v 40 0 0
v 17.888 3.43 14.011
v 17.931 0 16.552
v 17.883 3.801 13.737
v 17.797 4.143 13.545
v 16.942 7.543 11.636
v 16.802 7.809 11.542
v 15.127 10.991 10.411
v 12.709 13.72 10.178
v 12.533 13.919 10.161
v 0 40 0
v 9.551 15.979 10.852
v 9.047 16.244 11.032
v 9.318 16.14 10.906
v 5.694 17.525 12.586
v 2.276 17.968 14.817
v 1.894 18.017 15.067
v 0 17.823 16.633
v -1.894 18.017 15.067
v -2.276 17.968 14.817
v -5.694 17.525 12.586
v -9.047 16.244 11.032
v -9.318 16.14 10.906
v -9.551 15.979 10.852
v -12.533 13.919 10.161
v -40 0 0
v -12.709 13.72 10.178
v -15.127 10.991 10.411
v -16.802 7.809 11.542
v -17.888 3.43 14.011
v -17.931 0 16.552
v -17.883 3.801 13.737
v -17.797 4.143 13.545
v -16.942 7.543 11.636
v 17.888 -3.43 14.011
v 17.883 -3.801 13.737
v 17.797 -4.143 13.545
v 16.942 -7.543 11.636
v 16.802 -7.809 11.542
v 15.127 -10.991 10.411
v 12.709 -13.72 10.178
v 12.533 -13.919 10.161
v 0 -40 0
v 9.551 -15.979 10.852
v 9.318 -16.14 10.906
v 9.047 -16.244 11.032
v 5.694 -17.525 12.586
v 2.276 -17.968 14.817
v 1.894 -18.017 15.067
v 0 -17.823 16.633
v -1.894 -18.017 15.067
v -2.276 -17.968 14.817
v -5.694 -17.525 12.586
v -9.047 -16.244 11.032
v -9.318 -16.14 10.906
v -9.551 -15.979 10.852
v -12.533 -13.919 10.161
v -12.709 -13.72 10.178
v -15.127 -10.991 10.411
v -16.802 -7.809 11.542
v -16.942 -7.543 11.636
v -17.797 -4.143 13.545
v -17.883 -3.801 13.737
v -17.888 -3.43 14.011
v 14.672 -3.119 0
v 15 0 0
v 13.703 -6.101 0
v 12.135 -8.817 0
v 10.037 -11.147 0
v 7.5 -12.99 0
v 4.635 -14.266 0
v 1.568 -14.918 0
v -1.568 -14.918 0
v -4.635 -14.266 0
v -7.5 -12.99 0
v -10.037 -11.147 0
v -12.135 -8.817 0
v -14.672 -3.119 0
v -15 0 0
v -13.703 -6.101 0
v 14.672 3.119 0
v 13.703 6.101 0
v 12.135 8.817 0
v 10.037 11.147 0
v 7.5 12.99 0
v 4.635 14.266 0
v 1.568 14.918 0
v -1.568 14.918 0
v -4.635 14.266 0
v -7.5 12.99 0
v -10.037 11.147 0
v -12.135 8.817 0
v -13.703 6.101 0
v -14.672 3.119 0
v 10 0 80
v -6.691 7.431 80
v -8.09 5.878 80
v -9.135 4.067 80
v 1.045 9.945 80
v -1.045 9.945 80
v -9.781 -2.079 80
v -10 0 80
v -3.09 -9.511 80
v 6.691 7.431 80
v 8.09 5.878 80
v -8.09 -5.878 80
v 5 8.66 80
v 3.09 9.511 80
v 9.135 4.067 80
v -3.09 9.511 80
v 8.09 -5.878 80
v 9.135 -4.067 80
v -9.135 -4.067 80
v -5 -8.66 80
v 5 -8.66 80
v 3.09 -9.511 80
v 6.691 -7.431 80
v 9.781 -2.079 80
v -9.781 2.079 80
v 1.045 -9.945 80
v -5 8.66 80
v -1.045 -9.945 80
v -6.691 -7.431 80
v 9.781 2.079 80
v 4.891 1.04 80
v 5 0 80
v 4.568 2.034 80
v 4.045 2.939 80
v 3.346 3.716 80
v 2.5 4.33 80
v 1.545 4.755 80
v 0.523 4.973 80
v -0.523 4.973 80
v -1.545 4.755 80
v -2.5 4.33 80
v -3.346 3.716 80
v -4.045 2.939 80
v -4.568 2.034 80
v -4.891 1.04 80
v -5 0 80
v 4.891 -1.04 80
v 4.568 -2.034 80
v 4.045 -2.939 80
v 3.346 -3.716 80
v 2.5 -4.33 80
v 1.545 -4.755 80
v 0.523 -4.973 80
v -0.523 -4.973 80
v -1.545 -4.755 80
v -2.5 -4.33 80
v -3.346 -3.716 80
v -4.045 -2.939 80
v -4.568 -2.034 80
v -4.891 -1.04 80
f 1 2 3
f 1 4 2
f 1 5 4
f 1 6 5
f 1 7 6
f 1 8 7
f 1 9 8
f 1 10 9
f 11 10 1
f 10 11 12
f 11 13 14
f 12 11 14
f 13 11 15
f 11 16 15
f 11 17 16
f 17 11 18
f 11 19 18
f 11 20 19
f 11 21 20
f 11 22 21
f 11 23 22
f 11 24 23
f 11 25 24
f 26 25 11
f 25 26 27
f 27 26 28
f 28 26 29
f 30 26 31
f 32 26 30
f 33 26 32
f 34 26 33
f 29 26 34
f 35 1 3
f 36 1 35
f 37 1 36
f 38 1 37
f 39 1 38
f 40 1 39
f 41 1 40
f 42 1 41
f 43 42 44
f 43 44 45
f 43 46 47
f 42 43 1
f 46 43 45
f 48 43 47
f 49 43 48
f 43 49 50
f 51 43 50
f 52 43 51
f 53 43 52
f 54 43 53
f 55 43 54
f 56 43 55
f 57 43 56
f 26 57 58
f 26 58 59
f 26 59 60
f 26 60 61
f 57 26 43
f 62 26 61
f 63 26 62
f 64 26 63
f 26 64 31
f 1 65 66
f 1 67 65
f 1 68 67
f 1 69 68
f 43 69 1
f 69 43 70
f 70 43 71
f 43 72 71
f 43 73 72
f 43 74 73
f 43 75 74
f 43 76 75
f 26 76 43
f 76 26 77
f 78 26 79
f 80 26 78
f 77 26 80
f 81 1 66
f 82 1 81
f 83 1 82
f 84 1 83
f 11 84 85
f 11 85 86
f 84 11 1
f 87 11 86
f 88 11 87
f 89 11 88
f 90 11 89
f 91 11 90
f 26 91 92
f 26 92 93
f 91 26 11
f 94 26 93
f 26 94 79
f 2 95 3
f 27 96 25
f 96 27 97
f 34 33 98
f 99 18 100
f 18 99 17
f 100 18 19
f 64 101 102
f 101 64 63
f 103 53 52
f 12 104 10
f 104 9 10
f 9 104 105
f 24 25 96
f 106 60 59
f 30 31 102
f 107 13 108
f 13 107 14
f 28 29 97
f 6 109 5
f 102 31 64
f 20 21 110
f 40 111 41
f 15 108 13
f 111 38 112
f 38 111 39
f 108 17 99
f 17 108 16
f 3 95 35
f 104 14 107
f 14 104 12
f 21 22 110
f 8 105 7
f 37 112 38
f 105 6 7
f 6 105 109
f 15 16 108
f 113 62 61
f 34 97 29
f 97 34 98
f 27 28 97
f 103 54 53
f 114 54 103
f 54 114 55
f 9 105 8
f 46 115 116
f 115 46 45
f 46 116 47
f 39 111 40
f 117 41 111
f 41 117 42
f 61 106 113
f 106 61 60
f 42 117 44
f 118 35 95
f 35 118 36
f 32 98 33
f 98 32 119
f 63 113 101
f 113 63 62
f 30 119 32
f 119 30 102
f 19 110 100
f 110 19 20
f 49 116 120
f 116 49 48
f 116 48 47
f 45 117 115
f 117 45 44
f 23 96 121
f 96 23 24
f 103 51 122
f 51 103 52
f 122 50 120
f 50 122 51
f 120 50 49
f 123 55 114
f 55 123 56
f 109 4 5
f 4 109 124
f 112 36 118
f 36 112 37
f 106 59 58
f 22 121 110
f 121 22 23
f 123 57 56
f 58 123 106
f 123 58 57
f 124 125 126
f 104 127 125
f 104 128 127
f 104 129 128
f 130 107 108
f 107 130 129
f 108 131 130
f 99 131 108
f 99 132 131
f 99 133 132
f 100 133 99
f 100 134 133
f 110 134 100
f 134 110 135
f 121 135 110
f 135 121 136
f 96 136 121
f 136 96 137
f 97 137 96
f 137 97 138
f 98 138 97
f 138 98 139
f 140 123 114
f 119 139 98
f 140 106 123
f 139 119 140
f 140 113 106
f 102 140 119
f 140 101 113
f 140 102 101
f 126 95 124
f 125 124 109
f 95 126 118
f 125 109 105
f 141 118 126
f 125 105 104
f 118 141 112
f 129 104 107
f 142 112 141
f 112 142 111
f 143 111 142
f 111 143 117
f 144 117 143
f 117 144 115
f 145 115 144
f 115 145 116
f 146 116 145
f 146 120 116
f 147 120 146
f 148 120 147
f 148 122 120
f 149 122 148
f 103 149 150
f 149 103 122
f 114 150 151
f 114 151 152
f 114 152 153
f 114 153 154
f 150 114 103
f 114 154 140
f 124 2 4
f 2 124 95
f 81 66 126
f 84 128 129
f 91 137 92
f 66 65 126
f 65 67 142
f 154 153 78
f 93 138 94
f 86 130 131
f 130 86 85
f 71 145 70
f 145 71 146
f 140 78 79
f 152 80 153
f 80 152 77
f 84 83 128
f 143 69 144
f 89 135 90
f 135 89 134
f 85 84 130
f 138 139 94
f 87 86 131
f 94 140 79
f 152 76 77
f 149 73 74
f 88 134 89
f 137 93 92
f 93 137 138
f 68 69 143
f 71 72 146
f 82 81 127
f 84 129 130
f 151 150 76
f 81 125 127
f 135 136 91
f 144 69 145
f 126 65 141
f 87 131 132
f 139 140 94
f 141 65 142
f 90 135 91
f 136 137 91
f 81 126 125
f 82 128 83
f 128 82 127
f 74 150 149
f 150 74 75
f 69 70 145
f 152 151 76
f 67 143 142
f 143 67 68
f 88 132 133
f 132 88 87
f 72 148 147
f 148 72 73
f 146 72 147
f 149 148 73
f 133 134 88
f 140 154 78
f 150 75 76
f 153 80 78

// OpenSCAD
module p1() {
    h=5;
    difference() {
        cylinder(h=h, r=20);
        cylinder(h=h, r=10);
        
    }
}



module p2() {
    difference() {
        cylinder(h=80, r=20);
        translate([0,0,2])
        cylinder(h=80, r=18);
    }
}

module p3() {
    module solid() {
        cylinder(r1=40, r2=0, h=30, $fn=4);
        cylinder(r1=20, r2=10, h=80, $fn=30);
    }
    difference() {
        solid();
        cylinder(r1=15, r2=5, h=80, $fn=30);
    }
}


p3();
